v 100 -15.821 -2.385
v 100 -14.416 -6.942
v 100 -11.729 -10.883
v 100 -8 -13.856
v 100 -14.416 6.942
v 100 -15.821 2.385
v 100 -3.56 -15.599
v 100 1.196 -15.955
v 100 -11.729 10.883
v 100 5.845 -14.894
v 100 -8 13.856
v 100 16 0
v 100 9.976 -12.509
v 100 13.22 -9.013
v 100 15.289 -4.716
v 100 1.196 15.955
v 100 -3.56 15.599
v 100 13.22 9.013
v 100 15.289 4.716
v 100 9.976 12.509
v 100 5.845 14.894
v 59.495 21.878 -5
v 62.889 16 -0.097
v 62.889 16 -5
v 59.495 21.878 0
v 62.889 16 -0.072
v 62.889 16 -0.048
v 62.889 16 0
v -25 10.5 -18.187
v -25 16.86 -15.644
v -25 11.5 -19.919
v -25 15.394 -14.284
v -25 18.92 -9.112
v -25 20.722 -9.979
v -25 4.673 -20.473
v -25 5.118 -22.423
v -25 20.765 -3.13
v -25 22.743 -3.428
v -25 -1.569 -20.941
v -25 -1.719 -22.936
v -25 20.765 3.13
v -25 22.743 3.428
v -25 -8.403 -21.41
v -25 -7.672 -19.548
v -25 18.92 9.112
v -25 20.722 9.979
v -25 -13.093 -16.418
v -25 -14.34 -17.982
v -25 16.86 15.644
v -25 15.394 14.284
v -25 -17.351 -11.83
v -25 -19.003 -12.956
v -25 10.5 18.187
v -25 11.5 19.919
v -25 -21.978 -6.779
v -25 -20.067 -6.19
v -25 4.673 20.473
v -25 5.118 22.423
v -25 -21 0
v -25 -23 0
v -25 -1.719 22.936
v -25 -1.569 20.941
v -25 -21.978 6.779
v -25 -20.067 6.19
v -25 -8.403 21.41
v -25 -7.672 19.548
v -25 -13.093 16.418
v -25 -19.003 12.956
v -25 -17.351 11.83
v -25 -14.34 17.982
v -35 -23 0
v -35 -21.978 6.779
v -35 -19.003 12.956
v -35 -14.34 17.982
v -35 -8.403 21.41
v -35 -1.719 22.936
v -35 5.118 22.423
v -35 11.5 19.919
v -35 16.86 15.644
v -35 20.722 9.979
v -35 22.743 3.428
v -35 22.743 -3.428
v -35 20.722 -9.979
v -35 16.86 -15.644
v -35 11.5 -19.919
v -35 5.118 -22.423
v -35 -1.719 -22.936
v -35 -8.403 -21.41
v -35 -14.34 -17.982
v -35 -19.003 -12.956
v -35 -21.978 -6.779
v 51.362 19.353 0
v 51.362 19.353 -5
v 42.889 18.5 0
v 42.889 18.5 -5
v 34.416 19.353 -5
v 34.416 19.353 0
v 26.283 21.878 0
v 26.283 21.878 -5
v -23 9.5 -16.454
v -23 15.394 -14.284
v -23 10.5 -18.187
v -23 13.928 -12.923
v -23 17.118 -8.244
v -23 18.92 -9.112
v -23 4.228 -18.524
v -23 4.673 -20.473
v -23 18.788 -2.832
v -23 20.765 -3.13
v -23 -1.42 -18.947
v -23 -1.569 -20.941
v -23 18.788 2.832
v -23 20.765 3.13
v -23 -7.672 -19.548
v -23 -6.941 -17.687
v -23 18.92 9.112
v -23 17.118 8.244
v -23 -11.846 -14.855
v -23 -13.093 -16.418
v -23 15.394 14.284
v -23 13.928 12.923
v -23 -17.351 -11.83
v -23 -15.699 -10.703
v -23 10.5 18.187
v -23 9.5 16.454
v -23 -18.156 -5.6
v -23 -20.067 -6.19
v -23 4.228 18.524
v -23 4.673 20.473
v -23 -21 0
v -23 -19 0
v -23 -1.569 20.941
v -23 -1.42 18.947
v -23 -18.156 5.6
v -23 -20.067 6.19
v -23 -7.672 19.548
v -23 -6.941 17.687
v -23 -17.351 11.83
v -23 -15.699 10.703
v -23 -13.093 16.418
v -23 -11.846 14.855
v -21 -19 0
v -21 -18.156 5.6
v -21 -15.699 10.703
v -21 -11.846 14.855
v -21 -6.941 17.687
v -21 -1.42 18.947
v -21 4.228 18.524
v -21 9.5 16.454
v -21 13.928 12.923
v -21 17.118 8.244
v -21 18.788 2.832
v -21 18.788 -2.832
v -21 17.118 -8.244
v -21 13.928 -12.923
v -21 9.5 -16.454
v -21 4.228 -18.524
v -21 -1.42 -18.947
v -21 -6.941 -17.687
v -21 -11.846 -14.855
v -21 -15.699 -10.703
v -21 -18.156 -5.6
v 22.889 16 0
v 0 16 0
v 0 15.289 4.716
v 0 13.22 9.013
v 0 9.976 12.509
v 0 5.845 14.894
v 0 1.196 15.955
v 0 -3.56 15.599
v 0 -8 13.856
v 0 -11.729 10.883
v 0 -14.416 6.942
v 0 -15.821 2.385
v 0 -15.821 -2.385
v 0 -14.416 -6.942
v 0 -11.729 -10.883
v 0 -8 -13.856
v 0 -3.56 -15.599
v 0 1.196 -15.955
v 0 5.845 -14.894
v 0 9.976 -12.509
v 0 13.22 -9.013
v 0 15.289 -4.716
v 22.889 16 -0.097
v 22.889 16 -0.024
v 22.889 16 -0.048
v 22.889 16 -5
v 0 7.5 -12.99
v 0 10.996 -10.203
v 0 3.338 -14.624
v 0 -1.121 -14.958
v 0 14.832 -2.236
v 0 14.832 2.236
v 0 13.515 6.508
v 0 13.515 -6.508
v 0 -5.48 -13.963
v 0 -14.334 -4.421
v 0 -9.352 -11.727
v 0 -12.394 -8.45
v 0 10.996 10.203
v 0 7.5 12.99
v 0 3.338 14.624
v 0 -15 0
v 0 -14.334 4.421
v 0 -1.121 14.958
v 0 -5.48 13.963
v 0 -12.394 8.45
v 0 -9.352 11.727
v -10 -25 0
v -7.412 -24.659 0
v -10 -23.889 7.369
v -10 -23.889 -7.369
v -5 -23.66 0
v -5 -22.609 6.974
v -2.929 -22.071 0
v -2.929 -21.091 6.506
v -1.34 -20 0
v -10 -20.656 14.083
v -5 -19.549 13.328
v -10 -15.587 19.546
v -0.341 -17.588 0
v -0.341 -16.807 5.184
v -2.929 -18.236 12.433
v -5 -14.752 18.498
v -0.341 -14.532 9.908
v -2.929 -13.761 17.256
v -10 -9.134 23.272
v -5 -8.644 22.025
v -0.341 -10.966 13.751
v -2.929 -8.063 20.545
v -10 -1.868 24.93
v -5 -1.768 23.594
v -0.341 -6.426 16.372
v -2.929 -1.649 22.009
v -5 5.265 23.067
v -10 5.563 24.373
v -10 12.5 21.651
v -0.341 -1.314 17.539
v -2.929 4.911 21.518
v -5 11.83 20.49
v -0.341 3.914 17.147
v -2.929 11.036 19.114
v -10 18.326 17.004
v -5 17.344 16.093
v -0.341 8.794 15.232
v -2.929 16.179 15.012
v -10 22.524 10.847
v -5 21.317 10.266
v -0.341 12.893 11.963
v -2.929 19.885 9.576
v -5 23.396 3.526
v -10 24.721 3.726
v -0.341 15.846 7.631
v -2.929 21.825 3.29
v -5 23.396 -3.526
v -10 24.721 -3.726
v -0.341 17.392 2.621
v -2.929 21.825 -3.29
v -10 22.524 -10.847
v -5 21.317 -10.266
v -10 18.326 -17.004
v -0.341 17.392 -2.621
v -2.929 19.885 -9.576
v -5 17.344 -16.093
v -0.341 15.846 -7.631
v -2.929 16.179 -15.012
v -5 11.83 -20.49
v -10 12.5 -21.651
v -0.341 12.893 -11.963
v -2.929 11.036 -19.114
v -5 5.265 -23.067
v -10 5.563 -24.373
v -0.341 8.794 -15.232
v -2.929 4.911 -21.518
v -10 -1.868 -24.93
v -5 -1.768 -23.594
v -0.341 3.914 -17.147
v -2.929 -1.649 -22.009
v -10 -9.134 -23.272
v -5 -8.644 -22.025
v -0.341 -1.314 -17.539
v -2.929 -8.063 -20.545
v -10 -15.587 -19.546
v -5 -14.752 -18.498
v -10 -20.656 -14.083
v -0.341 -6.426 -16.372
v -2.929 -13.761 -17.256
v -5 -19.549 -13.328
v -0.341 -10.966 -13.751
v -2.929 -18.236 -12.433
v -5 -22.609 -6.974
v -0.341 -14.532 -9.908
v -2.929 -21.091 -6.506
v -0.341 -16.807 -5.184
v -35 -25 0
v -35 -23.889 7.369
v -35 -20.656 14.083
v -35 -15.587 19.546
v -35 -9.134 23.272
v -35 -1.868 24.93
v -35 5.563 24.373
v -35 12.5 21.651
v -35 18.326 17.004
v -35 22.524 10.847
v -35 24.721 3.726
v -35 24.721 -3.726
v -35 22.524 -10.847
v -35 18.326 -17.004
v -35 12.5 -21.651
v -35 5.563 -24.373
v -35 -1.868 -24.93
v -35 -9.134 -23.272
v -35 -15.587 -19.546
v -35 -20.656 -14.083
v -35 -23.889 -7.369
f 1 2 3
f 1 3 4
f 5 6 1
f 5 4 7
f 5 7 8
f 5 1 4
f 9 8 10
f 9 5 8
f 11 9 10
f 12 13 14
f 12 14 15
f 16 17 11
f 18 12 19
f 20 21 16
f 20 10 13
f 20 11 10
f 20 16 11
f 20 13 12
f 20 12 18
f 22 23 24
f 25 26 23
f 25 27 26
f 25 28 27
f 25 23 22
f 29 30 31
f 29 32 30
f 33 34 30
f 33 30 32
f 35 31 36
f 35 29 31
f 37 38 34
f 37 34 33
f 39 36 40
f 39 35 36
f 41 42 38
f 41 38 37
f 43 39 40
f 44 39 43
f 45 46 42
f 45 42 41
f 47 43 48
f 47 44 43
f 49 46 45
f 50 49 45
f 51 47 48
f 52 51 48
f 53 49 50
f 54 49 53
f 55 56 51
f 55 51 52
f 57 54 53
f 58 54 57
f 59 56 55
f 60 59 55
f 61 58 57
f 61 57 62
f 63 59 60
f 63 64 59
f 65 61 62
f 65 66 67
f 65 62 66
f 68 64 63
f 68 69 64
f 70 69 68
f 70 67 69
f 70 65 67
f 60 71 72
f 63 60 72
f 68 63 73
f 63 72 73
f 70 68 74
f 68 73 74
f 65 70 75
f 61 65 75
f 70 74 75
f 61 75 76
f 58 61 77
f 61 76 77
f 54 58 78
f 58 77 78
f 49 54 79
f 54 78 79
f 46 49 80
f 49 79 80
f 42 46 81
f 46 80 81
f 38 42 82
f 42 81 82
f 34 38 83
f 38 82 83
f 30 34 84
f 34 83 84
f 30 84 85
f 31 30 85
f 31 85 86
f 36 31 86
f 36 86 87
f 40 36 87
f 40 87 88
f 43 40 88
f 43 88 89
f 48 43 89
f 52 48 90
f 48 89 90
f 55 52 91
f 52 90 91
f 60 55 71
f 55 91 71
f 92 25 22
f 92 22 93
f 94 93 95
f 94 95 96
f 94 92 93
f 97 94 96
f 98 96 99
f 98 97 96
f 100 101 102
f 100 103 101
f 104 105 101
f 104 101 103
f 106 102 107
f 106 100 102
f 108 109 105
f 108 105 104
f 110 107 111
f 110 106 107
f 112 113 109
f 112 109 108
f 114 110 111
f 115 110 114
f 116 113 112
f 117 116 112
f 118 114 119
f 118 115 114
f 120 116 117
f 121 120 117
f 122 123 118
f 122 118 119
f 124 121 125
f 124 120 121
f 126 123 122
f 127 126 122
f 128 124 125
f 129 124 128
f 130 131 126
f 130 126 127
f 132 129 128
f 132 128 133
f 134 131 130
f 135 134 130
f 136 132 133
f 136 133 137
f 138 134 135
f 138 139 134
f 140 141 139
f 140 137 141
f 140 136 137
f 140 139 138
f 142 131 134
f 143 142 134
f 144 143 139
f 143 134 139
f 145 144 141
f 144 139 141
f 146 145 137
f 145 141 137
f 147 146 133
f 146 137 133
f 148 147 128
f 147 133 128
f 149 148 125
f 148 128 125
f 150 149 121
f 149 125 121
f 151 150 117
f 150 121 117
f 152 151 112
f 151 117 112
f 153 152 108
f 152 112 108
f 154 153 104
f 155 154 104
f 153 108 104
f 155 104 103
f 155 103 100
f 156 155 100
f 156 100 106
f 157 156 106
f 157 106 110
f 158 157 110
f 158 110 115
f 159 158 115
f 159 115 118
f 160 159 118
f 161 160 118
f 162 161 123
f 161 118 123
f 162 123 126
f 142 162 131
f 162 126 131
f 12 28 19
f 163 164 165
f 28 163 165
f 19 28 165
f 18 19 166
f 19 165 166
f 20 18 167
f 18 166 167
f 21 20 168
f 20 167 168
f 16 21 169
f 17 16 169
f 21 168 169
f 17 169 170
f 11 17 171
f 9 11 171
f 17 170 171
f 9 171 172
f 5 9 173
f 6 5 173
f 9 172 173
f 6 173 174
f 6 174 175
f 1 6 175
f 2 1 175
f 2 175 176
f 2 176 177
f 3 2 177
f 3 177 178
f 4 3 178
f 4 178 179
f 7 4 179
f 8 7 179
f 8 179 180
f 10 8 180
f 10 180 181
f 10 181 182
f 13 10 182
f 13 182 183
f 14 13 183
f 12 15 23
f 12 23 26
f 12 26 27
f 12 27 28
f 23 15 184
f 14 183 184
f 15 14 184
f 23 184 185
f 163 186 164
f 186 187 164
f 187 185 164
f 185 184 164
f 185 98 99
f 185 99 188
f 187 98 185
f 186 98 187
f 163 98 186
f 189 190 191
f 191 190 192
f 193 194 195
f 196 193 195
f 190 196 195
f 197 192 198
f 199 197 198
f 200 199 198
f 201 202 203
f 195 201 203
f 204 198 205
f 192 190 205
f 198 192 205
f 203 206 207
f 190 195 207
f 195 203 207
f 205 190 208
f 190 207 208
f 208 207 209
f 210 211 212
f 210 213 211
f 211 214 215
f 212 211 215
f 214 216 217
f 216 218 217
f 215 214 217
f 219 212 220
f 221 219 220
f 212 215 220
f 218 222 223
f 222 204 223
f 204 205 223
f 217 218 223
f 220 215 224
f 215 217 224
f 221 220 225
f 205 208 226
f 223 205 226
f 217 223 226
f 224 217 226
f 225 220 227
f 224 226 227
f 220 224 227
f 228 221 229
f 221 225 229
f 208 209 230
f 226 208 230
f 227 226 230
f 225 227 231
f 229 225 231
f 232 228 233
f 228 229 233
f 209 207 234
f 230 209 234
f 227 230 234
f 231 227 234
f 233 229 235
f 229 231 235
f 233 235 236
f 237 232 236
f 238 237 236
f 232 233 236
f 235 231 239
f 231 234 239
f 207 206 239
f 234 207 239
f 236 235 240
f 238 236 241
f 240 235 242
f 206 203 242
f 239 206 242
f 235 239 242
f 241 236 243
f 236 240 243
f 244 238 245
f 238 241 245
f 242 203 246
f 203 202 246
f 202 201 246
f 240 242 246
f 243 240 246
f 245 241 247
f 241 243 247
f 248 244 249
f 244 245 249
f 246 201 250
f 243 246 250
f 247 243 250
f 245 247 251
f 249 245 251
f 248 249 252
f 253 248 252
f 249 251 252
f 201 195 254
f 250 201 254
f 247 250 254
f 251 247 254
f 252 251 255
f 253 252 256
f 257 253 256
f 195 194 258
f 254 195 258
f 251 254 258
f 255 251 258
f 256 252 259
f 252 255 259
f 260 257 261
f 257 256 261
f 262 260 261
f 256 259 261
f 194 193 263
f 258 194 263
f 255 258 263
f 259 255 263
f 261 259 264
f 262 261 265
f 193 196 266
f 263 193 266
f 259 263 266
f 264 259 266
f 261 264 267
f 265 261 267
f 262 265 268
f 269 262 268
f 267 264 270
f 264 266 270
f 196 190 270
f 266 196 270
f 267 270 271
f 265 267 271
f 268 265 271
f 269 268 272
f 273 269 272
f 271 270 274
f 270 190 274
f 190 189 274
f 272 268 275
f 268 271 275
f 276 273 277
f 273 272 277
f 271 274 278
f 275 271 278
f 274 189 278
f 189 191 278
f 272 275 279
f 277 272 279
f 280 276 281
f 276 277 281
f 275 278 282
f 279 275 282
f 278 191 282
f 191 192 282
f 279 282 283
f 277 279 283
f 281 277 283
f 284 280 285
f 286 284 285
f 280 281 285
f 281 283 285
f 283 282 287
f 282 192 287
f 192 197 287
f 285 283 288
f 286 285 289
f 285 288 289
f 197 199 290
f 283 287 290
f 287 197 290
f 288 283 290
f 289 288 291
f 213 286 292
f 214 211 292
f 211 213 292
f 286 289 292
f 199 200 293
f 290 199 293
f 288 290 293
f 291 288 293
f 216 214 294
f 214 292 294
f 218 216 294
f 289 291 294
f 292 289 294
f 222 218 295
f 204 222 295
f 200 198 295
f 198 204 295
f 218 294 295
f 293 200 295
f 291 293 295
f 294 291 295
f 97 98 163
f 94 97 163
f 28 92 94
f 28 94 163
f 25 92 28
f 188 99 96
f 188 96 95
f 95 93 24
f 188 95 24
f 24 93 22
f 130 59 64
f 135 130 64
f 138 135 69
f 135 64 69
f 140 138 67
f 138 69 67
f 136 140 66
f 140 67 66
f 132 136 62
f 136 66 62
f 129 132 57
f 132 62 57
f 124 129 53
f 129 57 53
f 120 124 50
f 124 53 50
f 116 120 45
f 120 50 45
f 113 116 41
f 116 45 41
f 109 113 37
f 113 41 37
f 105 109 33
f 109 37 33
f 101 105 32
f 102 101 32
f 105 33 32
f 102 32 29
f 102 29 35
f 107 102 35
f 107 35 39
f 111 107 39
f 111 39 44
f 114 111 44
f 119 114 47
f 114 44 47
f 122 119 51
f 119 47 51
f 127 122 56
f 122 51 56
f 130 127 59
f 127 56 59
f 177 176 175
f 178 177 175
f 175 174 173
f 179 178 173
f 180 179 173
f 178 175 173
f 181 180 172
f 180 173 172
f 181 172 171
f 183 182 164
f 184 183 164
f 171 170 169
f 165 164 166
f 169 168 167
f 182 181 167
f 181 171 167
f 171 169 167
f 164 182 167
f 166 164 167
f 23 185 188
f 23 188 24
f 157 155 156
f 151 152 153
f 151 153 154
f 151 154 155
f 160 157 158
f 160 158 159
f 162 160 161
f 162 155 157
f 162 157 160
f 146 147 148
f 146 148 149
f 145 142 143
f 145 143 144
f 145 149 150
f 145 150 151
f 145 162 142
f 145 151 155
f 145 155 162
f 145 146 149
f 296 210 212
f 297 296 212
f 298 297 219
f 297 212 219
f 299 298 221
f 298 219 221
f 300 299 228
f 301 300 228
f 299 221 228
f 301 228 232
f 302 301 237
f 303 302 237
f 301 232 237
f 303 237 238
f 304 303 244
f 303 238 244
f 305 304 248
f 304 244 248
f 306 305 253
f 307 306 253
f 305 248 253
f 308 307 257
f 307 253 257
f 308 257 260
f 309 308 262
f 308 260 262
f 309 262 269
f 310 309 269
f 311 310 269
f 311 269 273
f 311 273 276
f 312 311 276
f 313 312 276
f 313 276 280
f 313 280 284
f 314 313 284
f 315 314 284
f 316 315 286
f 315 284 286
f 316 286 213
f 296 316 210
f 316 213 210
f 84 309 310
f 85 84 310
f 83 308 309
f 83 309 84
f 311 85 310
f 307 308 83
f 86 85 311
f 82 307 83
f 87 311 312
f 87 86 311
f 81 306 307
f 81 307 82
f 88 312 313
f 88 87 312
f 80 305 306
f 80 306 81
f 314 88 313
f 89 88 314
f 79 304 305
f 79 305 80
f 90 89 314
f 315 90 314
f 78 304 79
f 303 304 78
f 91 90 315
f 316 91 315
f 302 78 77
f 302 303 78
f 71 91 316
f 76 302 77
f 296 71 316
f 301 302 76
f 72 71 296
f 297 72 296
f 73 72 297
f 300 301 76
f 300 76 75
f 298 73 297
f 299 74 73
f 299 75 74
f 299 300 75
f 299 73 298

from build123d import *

# Parameters (mm, degrees)
F0_R      = 16
F1_DEPTH  = 100
F2_R      = 25
F3_DEPTH  = 35
F4_R      = 23
F5_DEPTH  = 10
F6_R      = 21
F7_DEPTH  = 2
F8_R      = 19
F9_DEPTH  = 2
F10_R     = 10
F12_DEPTH = 5


# Not quite as in the source:
# - a feature names something its author has since deleted; it is built from what else it names


with BuildPart() as f1:
    # F0 (on Right) → F1 (new body)
    with BuildSketch(Plane.YZ):
        Circle(F0_R)
    extrude(amount=F1_DEPTH)

    # F11 (on Top) → F12 (join)
    with BuildSketch(Plane.XY):
        with BuildLine():
            ThreePointArc((59.4952985912, 21.8782344051), (42.8892672062, 18.4997083247), (26.2832358212, 21.8782344051))
            Line((26.2832358212, 21.8782344051), (22.8892672062, 15.9997083247))
            Line((22.8892672062, 15.9997083247), (62.8892672062, 15.9997083247))
            Line((62.8892672062, 15.9997083247), (59.4952985912, 21.8782344051))
        make_face()
    extrude(amount=-F12_DEPTH)


with BuildPart() as f3:
    # F2 (on face) → F3 (new body)
    with BuildSketch(Plane(origin=(0, 0, 0), x_dir=(0, -1, 0), z_dir=(-1, 0, 0))):
        Circle(F2_R)
    extrude(amount=F3_DEPTH)

    # F4 (on face) → F5 (cut)
    with BuildSketch(Plane(origin=(-35, 0, 0), x_dir=(0, -1, 0), z_dir=(-1, 0, 0))):
        Circle(F4_R)
    extrude(amount=-F5_DEPTH, mode=Mode.SUBTRACT)

    # F6 (on face) → F7 (cut)
    with BuildSketch(Plane(origin=(-25, 0, 0), x_dir=(0, -1, 0), z_dir=(-1, 0, 0))):
        Circle(F6_R)
    extrude(amount=-F7_DEPTH, mode=Mode.SUBTRACT)

    # F8 (on face) → F9 (cut)
    with BuildSketch(Plane(origin=(-23, 0, 0), x_dir=(0, -1, 0), z_dir=(-1, 0, 0))):
        Circle(F8_R)
    extrude(amount=-F9_DEPTH, mode=Mode.SUBTRACT)

    # F10
    f10_edges = [f3.edges().sort_by_distance(p)[0] for p in [
        (0, 25, 0),
    ]]
    fillet(f10_edges, radius=F10_R)


solid = Compound([f1.part, f3.part])
